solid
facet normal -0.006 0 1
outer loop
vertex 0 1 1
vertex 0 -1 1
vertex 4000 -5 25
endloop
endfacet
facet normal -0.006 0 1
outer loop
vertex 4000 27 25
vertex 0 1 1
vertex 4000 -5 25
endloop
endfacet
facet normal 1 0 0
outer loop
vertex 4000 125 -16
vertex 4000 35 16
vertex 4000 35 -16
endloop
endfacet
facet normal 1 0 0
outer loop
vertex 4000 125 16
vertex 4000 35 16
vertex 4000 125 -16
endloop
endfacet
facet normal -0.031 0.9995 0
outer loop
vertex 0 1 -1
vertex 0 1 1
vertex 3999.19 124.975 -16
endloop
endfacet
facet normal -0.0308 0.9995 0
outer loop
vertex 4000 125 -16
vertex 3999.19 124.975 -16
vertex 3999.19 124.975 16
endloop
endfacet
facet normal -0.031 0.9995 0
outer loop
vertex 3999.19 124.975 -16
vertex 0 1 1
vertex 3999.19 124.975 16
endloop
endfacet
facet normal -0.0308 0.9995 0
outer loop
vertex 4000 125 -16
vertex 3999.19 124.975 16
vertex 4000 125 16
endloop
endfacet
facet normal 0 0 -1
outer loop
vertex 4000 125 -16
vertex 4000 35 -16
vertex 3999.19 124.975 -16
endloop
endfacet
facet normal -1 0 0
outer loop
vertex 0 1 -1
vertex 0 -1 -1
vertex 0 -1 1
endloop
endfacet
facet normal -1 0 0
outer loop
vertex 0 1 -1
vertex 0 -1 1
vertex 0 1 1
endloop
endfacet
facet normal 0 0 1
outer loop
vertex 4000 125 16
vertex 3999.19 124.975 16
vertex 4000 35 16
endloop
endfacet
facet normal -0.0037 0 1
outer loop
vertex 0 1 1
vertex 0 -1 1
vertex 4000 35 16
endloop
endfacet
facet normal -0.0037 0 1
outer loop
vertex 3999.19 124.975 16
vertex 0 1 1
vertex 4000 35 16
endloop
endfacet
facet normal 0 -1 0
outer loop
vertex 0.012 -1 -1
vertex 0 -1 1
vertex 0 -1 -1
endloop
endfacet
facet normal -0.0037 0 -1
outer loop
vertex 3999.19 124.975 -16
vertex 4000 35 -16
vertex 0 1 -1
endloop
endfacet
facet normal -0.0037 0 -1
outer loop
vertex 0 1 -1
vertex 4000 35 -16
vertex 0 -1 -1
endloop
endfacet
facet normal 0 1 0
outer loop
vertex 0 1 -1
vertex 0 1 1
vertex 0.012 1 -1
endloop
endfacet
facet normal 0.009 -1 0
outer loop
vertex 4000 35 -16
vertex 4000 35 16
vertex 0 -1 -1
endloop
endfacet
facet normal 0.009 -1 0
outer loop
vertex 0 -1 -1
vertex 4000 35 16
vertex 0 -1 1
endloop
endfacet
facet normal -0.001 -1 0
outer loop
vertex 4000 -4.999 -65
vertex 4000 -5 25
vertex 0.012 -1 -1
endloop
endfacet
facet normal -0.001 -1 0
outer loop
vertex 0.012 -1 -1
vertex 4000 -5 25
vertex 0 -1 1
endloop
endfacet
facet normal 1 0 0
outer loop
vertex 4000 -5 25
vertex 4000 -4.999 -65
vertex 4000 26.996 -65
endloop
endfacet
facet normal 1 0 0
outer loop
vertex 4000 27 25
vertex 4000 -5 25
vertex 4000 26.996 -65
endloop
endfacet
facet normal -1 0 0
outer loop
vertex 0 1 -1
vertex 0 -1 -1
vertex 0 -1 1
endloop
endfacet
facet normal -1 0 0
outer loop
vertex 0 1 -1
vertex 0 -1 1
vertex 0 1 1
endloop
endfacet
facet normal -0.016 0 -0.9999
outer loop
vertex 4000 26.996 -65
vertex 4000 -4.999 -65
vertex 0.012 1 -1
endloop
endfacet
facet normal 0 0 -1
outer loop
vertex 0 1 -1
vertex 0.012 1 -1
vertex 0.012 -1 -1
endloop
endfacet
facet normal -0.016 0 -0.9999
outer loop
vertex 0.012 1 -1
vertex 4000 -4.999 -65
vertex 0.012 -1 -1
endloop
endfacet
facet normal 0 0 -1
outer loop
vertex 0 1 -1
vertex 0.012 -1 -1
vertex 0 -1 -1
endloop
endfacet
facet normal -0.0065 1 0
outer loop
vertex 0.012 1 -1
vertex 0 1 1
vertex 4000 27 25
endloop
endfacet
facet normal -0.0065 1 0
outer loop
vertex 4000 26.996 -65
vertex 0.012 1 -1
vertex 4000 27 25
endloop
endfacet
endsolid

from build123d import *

# Parameters (mm, degrees)
F0_W      = 32
F0_H      = 90
F1_DEPTH  = 4000
F3_DEPTH  = 32.001
F5_DEPTH  = 89.9993800437
F6_DEPTH  = 0.3969928722
F7_W      = 90
F7_H      = 32
F7_W_2    = 45
F8_DEPTH  = 4000
F10_DEPTH = 81.001
F12_DEPTH = 125.99589731


with BuildPart() as f1:
    # F0 (on Right) → F1 (new body)
    with BuildSketch(Plane.YZ):
        with Locations((11, -20)):
            Rectangle(F0_W, F0_H)
    extrude(amount=F1_DEPTH)

    # F2 (on face) → F3 (cut, through all)
    with BuildSketch(Plane.XZ.offset(5)):
        Polygon((0, 25), (0, 1), (4000, 25), align=None)
        Polygon((4000, -65), (0, -1), (0, -65), align=None)
    extrude(amount=-F3_DEPTH, mode=Mode.SUBTRACT)

    # F4 (on face) → F5 (cut, through all)
    with BuildSketch(Plane(origin=(-0.005999784, 0, 0.9999640013), x_dir=(0.9999820005, 0, 0.005999892), z_dir=(-0.005999892, 0, 0.9999820005))):
        Polygon((0.005999892, 27), (0.005999892, 0.9999820005), (4000.077999244, 27), align=None)
        Polygon((4000.077999244, -5), (0.005999892, -0.9999820005), (0.005999892, -5), align=None)
    extrude(amount=-F5_DEPTH, mode=Mode.SUBTRACT)

    # F6 (cut, through all): faces of the model
    f6_faces = [f1.faces().sort_by_distance(p)[0] for p in [
        (0.0060005761, -2.9999910002, -9.60092e-05),
        (0.0060005761, 13.9999910002, -9.60092e-05),
    ]]
    extrude(f6_faces, amount=-F6_DEPTH, mode=Mode.SUBTRACT)


with BuildPart() as f8:
    # F7 (on Right) → F8 (new body)
    with BuildSketch(Plane.YZ):
        with Locations((80, 0)):
            Rectangle(F7_W, F7_H)
        with Locations((12.5, 0)):
            Rectangle(F7_W_2, F7_H)
    extrude(amount=F8_DEPTH)

    # F9 (on face) → F10 (cut, through all)
    with BuildSketch(Plane.XY.offset(16)):
        Polygon((4000, 35), (0, -1), (0, -10), (4000, -10), align=None)
        Polygon((0, 125), (0, 1), (4000, 125), align=None)
    extrude(amount=-F10_DEPTH, mode=Mode.SUBTRACT)

    # F11 (on face) → F12 (cut, through all)
    with BuildSketch(Plane(origin=(0.0089992711, -0.9999190066, 0), x_dir=(0.9999595025, 0.0089996355, 0), z_dir=(0.0089996355, -0.9999595025, 0))):
        Polygon((-0.0089996355, 16), (-0.0089996355, 1), (4000.1529970841, 16), align=None)
        Polygon((4000.1529970841, -16), (-0.0089996355, -1), (-0.0089996355, -16), align=None)
    extrude(amount=-F12_DEPTH, mode=Mode.SUBTRACT)


solid = Compound([f1.part, f8.part])
